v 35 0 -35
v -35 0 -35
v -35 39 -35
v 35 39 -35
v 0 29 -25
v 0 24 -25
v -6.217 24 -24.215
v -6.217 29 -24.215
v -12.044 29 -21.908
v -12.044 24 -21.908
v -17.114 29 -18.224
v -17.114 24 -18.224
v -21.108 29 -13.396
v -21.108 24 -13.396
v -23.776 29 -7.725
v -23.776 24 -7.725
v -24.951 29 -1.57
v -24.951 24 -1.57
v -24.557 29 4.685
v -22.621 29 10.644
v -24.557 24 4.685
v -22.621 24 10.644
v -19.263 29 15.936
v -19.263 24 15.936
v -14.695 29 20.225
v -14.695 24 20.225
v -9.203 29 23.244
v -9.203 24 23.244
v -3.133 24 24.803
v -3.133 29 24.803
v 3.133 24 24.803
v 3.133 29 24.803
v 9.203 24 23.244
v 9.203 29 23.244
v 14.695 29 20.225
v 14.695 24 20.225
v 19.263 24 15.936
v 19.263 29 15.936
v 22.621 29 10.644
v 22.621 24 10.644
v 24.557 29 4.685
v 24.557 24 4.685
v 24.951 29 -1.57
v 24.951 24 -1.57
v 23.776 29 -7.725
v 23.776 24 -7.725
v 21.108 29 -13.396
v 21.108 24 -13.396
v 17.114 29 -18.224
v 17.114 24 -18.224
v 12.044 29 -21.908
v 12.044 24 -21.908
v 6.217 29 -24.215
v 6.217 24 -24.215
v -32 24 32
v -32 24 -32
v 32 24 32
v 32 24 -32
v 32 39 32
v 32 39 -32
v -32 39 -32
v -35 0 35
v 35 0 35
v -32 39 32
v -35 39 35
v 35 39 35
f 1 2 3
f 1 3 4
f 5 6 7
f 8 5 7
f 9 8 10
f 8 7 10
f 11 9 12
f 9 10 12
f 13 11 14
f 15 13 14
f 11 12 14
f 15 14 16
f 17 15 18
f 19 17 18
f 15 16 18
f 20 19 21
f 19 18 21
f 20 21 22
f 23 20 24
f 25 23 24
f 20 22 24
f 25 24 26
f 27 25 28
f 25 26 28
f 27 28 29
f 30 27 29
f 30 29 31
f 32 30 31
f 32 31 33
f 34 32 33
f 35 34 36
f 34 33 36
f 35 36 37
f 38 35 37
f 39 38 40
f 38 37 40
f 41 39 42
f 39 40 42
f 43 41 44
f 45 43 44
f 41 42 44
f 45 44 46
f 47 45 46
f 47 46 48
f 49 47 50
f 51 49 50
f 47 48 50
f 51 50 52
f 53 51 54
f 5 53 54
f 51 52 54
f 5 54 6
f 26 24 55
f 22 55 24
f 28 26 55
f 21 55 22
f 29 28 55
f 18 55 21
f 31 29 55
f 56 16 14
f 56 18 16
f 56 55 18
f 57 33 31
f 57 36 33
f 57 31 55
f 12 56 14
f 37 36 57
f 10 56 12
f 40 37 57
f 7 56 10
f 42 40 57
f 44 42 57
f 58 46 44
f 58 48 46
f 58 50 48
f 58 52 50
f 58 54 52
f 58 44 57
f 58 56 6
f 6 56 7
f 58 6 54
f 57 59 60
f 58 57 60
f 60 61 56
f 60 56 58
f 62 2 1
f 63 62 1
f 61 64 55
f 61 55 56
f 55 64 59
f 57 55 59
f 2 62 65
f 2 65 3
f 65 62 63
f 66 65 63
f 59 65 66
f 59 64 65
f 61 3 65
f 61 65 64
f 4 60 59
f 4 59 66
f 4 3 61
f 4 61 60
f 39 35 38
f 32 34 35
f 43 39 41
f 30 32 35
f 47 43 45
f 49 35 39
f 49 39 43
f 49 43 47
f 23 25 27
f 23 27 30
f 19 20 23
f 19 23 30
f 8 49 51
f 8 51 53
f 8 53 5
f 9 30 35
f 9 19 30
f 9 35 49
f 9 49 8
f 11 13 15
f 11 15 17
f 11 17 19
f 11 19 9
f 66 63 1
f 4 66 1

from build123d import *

# Parameters (mm, degrees)
SKETCH1_W           = 70
SKETCH1_H           = 70
BOSS_EXTRUDE1_DEPTH = 39
SKETCH2_W           = 64
SKETCH2_H           = 64
CUT_EXTRUDE1_DEPTH  = 15
SKETCH3_R           = 25
BOSS_EXTRUDE2_DEPTH = 5


with BuildPart() as part:
    # Sketch1 → Boss-Extrude1 (new body)
    with BuildSketch(Plane(origin=(0, 0, 0), x_dir=(1, 0, 0), z_dir=(0, 1, 0))):
        Rectangle(SKETCH1_W, SKETCH1_H)
    extrude(amount=BOSS_EXTRUDE1_DEPTH)

    # Sketch2 → Cut-Extrude1 (cut)
    with BuildSketch(Plane(origin=(0, 39, 0), x_dir=(1, 0, 0), z_dir=(0, 1, 0))):
        Rectangle(SKETCH2_W, SKETCH2_H)
    extrude(amount=-CUT_EXTRUDE1_DEPTH, mode=Mode.SUBTRACT)

    # Sketch3 → Boss-Extrude2 (add)
    with BuildSketch(Plane(origin=(0, 24, 0), x_dir=(1, 0, 0), z_dir=(0, 1, 0))):
        with Locations(Location((0, 0, 0), (0, 0, 90))):
            Circle(SKETCH3_R)
    extrude(amount=BOSS_EXTRUDE2_DEPTH)


solid = part.part
